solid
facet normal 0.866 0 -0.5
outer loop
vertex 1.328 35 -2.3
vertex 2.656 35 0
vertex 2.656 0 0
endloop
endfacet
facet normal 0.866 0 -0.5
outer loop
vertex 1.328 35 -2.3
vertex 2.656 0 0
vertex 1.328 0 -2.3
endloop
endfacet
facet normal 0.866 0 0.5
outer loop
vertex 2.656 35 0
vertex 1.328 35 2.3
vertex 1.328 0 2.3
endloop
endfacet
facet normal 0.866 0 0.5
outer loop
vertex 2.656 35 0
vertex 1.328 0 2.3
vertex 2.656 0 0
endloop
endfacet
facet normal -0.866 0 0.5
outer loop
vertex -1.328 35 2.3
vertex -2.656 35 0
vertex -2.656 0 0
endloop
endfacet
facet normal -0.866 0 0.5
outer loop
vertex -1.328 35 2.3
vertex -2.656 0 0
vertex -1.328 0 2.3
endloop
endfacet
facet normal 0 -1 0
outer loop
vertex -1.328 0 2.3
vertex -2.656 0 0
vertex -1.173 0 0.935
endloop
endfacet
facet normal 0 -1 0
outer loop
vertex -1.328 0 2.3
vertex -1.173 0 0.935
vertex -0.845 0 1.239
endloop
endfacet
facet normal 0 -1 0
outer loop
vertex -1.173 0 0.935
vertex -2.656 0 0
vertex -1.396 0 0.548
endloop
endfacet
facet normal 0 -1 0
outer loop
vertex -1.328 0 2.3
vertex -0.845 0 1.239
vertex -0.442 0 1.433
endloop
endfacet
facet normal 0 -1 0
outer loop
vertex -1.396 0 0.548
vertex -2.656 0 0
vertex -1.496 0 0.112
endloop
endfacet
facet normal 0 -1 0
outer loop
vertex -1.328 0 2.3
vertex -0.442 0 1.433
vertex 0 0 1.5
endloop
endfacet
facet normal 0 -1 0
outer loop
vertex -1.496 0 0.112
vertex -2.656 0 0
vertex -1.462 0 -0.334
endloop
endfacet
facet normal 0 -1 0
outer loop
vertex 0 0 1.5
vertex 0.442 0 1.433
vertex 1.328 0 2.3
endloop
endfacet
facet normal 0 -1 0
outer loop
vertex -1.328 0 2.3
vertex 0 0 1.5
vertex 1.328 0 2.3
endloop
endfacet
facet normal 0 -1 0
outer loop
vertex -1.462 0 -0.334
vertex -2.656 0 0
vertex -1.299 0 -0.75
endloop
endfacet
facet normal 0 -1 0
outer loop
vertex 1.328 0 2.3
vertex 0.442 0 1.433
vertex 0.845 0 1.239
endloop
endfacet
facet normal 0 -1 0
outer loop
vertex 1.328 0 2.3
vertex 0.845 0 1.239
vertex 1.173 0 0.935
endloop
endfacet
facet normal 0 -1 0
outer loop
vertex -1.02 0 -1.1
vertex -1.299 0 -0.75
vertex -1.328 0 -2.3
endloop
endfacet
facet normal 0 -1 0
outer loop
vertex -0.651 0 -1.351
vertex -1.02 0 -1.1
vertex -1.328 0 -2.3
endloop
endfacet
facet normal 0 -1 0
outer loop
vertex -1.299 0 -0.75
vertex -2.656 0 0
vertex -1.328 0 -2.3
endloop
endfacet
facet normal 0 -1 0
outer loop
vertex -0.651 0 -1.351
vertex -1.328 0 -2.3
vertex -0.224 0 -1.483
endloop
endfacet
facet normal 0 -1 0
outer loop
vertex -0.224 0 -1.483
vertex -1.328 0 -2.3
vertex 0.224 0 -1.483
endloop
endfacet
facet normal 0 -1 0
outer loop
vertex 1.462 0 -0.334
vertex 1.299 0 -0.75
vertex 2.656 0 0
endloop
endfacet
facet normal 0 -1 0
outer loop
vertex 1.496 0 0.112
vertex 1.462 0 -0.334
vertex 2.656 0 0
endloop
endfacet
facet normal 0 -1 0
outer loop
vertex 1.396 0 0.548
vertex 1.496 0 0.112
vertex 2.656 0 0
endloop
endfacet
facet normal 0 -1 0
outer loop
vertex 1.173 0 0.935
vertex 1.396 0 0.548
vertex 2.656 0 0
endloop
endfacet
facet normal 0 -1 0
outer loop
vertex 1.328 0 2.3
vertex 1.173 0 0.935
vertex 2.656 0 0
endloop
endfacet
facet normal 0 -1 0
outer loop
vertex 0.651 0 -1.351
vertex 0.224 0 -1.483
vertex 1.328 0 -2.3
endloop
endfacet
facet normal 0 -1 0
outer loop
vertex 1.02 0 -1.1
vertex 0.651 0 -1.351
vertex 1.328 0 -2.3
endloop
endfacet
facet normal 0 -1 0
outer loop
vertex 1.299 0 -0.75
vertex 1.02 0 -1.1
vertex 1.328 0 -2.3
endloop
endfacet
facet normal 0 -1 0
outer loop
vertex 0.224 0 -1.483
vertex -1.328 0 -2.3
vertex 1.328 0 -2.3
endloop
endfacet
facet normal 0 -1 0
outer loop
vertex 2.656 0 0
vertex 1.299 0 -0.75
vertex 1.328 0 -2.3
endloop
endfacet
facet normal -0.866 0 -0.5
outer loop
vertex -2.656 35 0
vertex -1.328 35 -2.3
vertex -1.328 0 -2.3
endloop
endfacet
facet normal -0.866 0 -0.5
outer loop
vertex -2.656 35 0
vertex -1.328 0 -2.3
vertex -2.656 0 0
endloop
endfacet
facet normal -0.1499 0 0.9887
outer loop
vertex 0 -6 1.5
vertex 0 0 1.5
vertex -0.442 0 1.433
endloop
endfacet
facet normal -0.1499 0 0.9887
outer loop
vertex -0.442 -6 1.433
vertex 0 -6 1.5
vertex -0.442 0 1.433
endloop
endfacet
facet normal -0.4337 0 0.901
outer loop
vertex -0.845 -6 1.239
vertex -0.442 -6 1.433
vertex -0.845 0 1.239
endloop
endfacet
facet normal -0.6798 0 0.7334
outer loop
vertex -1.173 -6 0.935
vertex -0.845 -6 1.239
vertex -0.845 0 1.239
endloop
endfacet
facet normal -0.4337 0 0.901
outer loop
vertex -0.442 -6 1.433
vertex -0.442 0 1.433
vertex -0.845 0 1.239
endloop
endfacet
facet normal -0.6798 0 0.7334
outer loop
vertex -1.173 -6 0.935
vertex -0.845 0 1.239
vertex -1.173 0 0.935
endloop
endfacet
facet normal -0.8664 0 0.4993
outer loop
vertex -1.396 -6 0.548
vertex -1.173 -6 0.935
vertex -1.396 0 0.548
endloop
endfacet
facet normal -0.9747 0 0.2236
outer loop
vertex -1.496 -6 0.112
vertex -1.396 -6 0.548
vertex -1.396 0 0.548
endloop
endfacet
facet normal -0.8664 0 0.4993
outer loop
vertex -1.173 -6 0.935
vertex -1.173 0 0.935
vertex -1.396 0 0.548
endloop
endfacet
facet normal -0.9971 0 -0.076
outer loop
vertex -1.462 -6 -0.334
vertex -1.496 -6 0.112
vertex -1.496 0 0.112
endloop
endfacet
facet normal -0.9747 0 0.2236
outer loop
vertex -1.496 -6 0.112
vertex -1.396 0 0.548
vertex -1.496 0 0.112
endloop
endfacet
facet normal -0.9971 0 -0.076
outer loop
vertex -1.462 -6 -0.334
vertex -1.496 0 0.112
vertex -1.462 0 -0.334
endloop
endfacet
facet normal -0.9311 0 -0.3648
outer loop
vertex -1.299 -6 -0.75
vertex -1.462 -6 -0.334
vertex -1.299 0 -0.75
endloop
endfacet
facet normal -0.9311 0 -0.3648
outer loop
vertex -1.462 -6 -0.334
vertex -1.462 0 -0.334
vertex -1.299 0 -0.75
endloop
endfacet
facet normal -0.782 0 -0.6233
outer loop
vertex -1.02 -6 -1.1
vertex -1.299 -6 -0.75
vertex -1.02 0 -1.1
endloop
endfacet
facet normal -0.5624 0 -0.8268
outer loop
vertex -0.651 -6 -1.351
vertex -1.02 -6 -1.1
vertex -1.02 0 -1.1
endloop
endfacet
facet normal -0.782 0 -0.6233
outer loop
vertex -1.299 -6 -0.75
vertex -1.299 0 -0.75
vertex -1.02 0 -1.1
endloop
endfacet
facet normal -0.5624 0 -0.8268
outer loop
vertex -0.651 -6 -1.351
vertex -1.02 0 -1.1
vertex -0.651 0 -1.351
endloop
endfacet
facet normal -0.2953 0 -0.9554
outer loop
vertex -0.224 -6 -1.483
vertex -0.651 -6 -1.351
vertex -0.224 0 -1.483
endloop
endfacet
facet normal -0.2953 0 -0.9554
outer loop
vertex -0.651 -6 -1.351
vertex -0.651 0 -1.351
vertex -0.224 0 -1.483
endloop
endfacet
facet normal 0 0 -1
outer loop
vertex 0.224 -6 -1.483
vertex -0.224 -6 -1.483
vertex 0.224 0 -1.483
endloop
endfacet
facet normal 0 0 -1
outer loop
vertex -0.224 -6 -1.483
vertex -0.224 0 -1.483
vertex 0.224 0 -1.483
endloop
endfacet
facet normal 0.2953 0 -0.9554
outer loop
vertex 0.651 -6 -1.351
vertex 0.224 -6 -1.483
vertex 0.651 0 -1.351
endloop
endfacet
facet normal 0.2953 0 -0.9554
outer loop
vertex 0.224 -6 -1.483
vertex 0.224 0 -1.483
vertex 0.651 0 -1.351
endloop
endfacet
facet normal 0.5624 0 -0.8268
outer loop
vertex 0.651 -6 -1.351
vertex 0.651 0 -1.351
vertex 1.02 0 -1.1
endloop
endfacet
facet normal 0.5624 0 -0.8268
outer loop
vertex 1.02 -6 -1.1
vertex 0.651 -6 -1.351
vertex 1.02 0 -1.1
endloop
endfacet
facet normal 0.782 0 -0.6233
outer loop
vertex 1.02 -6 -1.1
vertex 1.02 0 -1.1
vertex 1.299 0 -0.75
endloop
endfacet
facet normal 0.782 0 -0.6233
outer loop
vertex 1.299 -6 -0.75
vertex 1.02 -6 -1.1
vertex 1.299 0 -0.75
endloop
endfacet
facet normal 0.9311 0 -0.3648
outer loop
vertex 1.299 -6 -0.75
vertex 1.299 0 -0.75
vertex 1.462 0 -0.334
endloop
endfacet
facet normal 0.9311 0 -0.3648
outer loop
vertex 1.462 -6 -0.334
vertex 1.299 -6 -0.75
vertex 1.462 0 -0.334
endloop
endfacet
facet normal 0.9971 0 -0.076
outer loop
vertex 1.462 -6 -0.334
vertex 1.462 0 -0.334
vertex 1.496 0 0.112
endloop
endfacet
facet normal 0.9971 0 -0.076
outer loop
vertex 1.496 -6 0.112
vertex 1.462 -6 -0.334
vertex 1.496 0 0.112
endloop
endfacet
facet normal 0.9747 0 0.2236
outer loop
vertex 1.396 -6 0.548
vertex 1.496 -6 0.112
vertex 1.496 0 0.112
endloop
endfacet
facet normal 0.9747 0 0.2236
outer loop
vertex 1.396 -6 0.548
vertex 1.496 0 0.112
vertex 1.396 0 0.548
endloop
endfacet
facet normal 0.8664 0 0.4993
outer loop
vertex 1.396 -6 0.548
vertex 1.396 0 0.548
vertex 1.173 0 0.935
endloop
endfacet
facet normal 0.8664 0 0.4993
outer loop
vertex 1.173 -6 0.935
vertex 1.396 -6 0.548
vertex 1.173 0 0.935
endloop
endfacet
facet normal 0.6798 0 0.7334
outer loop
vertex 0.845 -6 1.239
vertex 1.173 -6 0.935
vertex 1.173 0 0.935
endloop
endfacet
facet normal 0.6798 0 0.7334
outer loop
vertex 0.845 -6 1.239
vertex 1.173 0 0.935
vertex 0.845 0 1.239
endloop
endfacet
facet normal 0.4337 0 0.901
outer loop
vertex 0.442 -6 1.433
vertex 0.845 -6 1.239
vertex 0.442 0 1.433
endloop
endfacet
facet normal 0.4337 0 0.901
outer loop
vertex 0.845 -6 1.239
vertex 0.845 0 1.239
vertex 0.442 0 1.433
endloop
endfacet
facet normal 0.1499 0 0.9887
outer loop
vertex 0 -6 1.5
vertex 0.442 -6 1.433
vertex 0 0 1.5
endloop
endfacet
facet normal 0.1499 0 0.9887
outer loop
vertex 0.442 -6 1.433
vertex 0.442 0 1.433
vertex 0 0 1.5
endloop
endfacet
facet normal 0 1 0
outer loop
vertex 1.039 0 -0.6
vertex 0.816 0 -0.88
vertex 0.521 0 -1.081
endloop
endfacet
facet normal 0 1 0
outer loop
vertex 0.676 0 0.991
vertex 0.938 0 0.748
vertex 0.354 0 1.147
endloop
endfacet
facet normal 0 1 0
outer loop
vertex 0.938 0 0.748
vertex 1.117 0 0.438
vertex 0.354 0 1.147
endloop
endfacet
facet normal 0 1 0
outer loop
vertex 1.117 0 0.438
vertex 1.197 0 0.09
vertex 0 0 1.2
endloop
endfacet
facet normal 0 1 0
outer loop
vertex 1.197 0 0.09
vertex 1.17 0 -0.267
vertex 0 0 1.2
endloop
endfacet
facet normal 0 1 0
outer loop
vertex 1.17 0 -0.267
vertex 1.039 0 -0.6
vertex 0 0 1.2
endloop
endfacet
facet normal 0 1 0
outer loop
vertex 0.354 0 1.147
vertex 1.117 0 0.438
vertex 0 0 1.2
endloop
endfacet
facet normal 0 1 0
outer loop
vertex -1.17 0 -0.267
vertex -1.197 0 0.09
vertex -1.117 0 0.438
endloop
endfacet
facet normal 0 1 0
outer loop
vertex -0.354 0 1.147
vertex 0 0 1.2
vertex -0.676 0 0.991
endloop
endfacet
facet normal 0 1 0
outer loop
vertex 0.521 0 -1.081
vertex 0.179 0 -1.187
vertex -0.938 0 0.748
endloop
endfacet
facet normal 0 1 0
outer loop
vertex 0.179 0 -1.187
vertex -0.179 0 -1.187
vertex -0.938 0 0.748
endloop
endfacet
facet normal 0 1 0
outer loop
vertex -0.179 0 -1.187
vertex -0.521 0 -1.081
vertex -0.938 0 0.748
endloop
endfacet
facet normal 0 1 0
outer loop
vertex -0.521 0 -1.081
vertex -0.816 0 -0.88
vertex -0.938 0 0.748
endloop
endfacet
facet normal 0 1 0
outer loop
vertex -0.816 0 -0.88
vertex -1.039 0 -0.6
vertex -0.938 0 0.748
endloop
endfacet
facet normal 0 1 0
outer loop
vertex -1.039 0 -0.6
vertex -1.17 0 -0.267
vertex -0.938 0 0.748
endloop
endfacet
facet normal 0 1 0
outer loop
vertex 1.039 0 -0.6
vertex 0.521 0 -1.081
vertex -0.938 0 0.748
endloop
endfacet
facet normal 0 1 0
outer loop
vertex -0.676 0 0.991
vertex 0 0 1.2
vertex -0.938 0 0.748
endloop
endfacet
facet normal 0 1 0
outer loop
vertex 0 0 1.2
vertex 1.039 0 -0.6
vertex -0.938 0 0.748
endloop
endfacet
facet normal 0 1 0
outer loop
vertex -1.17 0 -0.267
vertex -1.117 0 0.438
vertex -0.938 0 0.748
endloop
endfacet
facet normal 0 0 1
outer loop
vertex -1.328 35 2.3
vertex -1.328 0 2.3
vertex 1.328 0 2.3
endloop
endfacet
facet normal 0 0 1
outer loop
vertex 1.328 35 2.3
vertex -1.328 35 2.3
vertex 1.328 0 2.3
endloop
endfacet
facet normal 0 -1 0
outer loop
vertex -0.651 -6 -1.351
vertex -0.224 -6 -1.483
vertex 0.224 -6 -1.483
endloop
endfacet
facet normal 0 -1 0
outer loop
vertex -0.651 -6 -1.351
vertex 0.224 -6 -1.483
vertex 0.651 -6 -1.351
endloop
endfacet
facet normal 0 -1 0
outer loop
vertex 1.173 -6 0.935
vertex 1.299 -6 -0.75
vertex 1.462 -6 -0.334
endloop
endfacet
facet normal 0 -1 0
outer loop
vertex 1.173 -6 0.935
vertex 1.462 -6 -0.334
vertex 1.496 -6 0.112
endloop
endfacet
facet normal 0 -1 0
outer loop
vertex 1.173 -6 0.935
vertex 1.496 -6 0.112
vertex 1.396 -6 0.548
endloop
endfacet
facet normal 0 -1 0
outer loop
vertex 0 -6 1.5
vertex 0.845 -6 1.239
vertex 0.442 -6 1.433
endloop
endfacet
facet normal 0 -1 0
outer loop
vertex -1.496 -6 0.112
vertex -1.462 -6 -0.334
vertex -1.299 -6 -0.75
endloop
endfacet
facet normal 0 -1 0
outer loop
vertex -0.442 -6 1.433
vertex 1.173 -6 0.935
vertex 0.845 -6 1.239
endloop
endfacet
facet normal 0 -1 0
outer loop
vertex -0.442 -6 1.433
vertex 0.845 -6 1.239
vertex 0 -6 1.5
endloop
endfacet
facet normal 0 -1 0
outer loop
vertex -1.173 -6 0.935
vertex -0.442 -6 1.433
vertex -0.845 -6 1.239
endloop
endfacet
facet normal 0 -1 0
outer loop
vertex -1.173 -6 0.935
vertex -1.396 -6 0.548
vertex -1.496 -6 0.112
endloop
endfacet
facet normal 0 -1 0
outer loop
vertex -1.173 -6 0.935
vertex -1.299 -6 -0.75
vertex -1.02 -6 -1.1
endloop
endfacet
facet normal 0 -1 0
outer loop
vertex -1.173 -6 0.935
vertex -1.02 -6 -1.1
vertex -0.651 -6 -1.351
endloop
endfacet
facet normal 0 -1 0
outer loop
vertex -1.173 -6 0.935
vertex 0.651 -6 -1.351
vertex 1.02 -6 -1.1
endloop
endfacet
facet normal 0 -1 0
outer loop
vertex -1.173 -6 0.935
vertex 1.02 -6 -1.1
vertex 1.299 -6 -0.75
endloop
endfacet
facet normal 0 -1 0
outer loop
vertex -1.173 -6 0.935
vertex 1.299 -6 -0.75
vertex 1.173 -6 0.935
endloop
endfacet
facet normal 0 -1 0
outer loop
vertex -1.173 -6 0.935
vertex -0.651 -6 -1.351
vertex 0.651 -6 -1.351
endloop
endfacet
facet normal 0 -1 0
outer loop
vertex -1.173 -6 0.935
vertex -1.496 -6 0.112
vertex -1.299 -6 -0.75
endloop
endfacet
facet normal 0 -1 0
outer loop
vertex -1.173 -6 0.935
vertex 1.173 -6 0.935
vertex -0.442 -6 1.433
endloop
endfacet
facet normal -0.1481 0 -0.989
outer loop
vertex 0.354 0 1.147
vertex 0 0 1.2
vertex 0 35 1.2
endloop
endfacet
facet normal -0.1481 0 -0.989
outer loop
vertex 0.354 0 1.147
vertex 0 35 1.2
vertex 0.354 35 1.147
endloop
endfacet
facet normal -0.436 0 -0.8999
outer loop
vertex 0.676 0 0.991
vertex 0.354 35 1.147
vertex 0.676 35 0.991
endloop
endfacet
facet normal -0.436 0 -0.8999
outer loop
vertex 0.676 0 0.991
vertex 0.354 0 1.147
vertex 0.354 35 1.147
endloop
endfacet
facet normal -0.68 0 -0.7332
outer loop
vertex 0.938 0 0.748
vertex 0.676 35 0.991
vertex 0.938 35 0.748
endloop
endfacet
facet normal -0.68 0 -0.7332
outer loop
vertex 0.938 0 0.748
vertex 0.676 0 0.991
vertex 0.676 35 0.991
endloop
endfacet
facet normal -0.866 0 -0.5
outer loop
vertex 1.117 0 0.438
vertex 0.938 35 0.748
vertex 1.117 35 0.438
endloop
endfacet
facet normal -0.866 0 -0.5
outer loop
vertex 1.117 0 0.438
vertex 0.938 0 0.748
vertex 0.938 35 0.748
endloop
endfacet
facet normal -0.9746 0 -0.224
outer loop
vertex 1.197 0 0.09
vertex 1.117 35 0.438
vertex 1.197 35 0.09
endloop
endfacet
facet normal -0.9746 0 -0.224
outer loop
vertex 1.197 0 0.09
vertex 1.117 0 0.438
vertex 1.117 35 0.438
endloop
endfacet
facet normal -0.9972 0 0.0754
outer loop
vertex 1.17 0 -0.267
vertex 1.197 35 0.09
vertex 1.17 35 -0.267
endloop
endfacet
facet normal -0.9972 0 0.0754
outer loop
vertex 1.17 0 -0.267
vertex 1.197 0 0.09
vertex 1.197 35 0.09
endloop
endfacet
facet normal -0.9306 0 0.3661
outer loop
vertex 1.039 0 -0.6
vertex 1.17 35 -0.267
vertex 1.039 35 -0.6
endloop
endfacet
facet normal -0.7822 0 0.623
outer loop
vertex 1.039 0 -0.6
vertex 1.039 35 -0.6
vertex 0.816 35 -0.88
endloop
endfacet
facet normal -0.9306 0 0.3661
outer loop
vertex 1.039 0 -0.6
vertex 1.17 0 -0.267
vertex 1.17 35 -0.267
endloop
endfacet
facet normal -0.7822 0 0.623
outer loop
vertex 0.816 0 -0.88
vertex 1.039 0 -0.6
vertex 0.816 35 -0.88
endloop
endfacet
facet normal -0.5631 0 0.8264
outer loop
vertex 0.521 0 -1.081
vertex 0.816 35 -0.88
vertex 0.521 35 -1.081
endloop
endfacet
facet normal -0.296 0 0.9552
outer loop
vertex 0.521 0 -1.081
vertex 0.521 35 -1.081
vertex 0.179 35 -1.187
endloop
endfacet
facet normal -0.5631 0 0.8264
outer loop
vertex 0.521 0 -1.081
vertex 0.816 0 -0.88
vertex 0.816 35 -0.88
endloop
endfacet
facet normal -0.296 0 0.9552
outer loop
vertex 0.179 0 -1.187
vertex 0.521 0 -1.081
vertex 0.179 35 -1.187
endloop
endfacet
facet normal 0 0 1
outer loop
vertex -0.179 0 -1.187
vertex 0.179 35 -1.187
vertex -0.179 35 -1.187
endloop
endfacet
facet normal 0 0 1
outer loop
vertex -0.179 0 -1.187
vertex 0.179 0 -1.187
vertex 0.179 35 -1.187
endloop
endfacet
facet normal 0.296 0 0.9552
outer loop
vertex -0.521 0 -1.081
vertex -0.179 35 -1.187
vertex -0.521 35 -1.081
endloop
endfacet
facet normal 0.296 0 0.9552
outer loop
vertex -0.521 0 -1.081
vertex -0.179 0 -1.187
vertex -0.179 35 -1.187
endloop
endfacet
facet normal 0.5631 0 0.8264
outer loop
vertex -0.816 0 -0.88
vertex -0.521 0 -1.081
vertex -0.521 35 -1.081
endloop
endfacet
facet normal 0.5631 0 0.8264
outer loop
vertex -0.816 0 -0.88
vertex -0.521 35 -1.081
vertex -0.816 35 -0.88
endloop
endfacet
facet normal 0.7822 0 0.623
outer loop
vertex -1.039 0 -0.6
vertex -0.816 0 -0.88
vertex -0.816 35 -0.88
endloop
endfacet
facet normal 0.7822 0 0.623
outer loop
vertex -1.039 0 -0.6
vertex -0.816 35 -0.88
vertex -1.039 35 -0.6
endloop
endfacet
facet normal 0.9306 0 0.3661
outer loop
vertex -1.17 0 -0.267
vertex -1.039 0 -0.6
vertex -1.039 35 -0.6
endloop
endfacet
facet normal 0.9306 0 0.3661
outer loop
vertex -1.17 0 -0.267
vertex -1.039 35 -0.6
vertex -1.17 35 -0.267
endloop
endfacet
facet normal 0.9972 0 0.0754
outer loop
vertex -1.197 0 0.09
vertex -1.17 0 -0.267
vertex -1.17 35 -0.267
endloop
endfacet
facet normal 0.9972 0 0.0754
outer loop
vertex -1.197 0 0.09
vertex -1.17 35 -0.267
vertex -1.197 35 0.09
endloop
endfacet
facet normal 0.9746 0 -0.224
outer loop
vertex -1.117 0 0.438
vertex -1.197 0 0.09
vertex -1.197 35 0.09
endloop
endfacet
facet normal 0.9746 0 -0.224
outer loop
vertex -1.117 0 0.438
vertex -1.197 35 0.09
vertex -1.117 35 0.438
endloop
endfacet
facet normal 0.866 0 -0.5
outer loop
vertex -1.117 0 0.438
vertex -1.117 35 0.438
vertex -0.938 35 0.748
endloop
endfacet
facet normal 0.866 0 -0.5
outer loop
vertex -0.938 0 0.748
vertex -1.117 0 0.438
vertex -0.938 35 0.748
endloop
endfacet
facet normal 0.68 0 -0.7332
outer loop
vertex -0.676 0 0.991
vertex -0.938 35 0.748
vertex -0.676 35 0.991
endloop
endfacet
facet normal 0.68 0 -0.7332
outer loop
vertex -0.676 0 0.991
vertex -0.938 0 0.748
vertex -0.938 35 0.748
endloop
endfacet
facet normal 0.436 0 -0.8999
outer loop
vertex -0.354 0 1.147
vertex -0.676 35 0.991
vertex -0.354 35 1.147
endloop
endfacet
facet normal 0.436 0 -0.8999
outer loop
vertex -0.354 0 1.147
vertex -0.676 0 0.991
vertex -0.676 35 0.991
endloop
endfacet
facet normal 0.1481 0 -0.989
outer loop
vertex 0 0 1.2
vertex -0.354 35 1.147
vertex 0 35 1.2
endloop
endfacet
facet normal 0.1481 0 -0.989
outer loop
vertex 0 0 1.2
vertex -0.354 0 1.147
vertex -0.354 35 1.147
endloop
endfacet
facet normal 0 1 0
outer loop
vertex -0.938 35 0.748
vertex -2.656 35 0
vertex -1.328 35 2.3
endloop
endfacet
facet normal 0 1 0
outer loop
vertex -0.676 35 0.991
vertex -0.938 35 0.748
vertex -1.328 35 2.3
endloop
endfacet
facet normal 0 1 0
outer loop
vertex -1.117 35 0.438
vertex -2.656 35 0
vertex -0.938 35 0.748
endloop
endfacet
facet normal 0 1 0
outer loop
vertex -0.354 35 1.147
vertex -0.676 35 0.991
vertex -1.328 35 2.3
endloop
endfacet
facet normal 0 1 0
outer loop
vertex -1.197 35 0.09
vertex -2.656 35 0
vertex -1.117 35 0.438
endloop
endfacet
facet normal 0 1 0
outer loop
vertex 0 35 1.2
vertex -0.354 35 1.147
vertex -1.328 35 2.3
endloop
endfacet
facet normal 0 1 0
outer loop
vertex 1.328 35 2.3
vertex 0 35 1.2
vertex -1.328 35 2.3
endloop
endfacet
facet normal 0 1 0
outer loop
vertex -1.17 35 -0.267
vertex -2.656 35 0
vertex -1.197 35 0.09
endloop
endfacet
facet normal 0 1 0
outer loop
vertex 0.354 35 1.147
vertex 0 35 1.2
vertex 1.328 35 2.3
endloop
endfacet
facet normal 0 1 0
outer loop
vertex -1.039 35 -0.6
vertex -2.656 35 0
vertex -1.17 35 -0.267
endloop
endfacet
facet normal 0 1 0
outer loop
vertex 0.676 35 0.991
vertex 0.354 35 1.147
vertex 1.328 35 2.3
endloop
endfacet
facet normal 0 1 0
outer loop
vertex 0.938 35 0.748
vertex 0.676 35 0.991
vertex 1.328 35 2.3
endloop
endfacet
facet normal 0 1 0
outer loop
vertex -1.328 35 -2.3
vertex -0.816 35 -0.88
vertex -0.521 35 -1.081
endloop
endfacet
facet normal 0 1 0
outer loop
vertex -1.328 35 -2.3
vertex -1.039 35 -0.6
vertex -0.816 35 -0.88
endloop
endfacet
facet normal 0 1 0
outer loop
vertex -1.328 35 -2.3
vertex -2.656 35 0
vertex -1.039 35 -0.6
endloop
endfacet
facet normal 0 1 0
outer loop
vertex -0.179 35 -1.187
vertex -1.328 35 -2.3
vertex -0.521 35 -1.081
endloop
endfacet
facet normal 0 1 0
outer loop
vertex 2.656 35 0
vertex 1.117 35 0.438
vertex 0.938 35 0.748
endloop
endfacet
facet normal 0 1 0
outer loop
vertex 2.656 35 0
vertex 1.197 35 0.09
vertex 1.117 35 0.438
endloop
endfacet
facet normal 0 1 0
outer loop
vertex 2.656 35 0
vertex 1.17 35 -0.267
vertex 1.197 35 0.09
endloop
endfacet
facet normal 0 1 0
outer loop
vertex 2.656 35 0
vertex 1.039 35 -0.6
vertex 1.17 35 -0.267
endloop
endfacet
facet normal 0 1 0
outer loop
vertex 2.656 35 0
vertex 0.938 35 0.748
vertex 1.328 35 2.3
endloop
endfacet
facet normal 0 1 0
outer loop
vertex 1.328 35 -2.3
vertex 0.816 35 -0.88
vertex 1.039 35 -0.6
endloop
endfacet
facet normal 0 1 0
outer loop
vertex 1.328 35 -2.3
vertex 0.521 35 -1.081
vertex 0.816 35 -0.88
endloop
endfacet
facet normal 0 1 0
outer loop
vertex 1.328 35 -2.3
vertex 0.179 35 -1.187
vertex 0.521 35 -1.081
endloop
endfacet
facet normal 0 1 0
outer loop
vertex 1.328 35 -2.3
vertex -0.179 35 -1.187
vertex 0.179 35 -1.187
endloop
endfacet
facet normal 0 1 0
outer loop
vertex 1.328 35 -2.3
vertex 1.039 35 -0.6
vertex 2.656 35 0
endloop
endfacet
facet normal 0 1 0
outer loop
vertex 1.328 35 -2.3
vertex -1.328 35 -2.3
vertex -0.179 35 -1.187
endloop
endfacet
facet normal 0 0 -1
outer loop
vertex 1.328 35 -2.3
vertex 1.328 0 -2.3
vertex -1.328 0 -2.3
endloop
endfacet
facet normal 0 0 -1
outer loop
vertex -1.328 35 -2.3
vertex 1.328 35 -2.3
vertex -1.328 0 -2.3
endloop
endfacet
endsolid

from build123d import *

# Parameters (mm, degrees)
SKETCH1_R           = 1.2
BOSS_EXTRUDE1_DEPTH = 35
SKETCH3_R           = 1.5
BOSS_EXTRUDE2_DEPTH = 6


with BuildPart() as part:
    # Sketch1 → Boss-Extrude1 (new body)
    with BuildSketch(Plane(origin=(0, 0, 0), x_dir=(1, 0, 0), z_dir=(0, 1, 0))):
        Polygon((2.655811238, 0), (1.327905619, 2.3), (-1.327905619, 2.3), (-2.655811238, 0), (-1.327905619, -2.3), (1.327905619, -2.3), align=None)
        with Locations(Location((0, 0, 0), (0, 0, 270))):
            Circle(SKETCH1_R, mode=Mode.SUBTRACT)
    extrude(amount=BOSS_EXTRUDE1_DEPTH)

    # Sketch3 → Boss-Extrude2 (add)
    with BuildSketch(Plane(origin=(0, 0, 0), x_dir=(-1, 0, 0), z_dir=(0, -1, 0))):
        with Locations(Location((0, 0, 0), (0, 0, 270))):
            Circle(SKETCH3_R)
    extrude(amount=BOSS_EXTRUDE2_DEPTH)


solid = part.part
